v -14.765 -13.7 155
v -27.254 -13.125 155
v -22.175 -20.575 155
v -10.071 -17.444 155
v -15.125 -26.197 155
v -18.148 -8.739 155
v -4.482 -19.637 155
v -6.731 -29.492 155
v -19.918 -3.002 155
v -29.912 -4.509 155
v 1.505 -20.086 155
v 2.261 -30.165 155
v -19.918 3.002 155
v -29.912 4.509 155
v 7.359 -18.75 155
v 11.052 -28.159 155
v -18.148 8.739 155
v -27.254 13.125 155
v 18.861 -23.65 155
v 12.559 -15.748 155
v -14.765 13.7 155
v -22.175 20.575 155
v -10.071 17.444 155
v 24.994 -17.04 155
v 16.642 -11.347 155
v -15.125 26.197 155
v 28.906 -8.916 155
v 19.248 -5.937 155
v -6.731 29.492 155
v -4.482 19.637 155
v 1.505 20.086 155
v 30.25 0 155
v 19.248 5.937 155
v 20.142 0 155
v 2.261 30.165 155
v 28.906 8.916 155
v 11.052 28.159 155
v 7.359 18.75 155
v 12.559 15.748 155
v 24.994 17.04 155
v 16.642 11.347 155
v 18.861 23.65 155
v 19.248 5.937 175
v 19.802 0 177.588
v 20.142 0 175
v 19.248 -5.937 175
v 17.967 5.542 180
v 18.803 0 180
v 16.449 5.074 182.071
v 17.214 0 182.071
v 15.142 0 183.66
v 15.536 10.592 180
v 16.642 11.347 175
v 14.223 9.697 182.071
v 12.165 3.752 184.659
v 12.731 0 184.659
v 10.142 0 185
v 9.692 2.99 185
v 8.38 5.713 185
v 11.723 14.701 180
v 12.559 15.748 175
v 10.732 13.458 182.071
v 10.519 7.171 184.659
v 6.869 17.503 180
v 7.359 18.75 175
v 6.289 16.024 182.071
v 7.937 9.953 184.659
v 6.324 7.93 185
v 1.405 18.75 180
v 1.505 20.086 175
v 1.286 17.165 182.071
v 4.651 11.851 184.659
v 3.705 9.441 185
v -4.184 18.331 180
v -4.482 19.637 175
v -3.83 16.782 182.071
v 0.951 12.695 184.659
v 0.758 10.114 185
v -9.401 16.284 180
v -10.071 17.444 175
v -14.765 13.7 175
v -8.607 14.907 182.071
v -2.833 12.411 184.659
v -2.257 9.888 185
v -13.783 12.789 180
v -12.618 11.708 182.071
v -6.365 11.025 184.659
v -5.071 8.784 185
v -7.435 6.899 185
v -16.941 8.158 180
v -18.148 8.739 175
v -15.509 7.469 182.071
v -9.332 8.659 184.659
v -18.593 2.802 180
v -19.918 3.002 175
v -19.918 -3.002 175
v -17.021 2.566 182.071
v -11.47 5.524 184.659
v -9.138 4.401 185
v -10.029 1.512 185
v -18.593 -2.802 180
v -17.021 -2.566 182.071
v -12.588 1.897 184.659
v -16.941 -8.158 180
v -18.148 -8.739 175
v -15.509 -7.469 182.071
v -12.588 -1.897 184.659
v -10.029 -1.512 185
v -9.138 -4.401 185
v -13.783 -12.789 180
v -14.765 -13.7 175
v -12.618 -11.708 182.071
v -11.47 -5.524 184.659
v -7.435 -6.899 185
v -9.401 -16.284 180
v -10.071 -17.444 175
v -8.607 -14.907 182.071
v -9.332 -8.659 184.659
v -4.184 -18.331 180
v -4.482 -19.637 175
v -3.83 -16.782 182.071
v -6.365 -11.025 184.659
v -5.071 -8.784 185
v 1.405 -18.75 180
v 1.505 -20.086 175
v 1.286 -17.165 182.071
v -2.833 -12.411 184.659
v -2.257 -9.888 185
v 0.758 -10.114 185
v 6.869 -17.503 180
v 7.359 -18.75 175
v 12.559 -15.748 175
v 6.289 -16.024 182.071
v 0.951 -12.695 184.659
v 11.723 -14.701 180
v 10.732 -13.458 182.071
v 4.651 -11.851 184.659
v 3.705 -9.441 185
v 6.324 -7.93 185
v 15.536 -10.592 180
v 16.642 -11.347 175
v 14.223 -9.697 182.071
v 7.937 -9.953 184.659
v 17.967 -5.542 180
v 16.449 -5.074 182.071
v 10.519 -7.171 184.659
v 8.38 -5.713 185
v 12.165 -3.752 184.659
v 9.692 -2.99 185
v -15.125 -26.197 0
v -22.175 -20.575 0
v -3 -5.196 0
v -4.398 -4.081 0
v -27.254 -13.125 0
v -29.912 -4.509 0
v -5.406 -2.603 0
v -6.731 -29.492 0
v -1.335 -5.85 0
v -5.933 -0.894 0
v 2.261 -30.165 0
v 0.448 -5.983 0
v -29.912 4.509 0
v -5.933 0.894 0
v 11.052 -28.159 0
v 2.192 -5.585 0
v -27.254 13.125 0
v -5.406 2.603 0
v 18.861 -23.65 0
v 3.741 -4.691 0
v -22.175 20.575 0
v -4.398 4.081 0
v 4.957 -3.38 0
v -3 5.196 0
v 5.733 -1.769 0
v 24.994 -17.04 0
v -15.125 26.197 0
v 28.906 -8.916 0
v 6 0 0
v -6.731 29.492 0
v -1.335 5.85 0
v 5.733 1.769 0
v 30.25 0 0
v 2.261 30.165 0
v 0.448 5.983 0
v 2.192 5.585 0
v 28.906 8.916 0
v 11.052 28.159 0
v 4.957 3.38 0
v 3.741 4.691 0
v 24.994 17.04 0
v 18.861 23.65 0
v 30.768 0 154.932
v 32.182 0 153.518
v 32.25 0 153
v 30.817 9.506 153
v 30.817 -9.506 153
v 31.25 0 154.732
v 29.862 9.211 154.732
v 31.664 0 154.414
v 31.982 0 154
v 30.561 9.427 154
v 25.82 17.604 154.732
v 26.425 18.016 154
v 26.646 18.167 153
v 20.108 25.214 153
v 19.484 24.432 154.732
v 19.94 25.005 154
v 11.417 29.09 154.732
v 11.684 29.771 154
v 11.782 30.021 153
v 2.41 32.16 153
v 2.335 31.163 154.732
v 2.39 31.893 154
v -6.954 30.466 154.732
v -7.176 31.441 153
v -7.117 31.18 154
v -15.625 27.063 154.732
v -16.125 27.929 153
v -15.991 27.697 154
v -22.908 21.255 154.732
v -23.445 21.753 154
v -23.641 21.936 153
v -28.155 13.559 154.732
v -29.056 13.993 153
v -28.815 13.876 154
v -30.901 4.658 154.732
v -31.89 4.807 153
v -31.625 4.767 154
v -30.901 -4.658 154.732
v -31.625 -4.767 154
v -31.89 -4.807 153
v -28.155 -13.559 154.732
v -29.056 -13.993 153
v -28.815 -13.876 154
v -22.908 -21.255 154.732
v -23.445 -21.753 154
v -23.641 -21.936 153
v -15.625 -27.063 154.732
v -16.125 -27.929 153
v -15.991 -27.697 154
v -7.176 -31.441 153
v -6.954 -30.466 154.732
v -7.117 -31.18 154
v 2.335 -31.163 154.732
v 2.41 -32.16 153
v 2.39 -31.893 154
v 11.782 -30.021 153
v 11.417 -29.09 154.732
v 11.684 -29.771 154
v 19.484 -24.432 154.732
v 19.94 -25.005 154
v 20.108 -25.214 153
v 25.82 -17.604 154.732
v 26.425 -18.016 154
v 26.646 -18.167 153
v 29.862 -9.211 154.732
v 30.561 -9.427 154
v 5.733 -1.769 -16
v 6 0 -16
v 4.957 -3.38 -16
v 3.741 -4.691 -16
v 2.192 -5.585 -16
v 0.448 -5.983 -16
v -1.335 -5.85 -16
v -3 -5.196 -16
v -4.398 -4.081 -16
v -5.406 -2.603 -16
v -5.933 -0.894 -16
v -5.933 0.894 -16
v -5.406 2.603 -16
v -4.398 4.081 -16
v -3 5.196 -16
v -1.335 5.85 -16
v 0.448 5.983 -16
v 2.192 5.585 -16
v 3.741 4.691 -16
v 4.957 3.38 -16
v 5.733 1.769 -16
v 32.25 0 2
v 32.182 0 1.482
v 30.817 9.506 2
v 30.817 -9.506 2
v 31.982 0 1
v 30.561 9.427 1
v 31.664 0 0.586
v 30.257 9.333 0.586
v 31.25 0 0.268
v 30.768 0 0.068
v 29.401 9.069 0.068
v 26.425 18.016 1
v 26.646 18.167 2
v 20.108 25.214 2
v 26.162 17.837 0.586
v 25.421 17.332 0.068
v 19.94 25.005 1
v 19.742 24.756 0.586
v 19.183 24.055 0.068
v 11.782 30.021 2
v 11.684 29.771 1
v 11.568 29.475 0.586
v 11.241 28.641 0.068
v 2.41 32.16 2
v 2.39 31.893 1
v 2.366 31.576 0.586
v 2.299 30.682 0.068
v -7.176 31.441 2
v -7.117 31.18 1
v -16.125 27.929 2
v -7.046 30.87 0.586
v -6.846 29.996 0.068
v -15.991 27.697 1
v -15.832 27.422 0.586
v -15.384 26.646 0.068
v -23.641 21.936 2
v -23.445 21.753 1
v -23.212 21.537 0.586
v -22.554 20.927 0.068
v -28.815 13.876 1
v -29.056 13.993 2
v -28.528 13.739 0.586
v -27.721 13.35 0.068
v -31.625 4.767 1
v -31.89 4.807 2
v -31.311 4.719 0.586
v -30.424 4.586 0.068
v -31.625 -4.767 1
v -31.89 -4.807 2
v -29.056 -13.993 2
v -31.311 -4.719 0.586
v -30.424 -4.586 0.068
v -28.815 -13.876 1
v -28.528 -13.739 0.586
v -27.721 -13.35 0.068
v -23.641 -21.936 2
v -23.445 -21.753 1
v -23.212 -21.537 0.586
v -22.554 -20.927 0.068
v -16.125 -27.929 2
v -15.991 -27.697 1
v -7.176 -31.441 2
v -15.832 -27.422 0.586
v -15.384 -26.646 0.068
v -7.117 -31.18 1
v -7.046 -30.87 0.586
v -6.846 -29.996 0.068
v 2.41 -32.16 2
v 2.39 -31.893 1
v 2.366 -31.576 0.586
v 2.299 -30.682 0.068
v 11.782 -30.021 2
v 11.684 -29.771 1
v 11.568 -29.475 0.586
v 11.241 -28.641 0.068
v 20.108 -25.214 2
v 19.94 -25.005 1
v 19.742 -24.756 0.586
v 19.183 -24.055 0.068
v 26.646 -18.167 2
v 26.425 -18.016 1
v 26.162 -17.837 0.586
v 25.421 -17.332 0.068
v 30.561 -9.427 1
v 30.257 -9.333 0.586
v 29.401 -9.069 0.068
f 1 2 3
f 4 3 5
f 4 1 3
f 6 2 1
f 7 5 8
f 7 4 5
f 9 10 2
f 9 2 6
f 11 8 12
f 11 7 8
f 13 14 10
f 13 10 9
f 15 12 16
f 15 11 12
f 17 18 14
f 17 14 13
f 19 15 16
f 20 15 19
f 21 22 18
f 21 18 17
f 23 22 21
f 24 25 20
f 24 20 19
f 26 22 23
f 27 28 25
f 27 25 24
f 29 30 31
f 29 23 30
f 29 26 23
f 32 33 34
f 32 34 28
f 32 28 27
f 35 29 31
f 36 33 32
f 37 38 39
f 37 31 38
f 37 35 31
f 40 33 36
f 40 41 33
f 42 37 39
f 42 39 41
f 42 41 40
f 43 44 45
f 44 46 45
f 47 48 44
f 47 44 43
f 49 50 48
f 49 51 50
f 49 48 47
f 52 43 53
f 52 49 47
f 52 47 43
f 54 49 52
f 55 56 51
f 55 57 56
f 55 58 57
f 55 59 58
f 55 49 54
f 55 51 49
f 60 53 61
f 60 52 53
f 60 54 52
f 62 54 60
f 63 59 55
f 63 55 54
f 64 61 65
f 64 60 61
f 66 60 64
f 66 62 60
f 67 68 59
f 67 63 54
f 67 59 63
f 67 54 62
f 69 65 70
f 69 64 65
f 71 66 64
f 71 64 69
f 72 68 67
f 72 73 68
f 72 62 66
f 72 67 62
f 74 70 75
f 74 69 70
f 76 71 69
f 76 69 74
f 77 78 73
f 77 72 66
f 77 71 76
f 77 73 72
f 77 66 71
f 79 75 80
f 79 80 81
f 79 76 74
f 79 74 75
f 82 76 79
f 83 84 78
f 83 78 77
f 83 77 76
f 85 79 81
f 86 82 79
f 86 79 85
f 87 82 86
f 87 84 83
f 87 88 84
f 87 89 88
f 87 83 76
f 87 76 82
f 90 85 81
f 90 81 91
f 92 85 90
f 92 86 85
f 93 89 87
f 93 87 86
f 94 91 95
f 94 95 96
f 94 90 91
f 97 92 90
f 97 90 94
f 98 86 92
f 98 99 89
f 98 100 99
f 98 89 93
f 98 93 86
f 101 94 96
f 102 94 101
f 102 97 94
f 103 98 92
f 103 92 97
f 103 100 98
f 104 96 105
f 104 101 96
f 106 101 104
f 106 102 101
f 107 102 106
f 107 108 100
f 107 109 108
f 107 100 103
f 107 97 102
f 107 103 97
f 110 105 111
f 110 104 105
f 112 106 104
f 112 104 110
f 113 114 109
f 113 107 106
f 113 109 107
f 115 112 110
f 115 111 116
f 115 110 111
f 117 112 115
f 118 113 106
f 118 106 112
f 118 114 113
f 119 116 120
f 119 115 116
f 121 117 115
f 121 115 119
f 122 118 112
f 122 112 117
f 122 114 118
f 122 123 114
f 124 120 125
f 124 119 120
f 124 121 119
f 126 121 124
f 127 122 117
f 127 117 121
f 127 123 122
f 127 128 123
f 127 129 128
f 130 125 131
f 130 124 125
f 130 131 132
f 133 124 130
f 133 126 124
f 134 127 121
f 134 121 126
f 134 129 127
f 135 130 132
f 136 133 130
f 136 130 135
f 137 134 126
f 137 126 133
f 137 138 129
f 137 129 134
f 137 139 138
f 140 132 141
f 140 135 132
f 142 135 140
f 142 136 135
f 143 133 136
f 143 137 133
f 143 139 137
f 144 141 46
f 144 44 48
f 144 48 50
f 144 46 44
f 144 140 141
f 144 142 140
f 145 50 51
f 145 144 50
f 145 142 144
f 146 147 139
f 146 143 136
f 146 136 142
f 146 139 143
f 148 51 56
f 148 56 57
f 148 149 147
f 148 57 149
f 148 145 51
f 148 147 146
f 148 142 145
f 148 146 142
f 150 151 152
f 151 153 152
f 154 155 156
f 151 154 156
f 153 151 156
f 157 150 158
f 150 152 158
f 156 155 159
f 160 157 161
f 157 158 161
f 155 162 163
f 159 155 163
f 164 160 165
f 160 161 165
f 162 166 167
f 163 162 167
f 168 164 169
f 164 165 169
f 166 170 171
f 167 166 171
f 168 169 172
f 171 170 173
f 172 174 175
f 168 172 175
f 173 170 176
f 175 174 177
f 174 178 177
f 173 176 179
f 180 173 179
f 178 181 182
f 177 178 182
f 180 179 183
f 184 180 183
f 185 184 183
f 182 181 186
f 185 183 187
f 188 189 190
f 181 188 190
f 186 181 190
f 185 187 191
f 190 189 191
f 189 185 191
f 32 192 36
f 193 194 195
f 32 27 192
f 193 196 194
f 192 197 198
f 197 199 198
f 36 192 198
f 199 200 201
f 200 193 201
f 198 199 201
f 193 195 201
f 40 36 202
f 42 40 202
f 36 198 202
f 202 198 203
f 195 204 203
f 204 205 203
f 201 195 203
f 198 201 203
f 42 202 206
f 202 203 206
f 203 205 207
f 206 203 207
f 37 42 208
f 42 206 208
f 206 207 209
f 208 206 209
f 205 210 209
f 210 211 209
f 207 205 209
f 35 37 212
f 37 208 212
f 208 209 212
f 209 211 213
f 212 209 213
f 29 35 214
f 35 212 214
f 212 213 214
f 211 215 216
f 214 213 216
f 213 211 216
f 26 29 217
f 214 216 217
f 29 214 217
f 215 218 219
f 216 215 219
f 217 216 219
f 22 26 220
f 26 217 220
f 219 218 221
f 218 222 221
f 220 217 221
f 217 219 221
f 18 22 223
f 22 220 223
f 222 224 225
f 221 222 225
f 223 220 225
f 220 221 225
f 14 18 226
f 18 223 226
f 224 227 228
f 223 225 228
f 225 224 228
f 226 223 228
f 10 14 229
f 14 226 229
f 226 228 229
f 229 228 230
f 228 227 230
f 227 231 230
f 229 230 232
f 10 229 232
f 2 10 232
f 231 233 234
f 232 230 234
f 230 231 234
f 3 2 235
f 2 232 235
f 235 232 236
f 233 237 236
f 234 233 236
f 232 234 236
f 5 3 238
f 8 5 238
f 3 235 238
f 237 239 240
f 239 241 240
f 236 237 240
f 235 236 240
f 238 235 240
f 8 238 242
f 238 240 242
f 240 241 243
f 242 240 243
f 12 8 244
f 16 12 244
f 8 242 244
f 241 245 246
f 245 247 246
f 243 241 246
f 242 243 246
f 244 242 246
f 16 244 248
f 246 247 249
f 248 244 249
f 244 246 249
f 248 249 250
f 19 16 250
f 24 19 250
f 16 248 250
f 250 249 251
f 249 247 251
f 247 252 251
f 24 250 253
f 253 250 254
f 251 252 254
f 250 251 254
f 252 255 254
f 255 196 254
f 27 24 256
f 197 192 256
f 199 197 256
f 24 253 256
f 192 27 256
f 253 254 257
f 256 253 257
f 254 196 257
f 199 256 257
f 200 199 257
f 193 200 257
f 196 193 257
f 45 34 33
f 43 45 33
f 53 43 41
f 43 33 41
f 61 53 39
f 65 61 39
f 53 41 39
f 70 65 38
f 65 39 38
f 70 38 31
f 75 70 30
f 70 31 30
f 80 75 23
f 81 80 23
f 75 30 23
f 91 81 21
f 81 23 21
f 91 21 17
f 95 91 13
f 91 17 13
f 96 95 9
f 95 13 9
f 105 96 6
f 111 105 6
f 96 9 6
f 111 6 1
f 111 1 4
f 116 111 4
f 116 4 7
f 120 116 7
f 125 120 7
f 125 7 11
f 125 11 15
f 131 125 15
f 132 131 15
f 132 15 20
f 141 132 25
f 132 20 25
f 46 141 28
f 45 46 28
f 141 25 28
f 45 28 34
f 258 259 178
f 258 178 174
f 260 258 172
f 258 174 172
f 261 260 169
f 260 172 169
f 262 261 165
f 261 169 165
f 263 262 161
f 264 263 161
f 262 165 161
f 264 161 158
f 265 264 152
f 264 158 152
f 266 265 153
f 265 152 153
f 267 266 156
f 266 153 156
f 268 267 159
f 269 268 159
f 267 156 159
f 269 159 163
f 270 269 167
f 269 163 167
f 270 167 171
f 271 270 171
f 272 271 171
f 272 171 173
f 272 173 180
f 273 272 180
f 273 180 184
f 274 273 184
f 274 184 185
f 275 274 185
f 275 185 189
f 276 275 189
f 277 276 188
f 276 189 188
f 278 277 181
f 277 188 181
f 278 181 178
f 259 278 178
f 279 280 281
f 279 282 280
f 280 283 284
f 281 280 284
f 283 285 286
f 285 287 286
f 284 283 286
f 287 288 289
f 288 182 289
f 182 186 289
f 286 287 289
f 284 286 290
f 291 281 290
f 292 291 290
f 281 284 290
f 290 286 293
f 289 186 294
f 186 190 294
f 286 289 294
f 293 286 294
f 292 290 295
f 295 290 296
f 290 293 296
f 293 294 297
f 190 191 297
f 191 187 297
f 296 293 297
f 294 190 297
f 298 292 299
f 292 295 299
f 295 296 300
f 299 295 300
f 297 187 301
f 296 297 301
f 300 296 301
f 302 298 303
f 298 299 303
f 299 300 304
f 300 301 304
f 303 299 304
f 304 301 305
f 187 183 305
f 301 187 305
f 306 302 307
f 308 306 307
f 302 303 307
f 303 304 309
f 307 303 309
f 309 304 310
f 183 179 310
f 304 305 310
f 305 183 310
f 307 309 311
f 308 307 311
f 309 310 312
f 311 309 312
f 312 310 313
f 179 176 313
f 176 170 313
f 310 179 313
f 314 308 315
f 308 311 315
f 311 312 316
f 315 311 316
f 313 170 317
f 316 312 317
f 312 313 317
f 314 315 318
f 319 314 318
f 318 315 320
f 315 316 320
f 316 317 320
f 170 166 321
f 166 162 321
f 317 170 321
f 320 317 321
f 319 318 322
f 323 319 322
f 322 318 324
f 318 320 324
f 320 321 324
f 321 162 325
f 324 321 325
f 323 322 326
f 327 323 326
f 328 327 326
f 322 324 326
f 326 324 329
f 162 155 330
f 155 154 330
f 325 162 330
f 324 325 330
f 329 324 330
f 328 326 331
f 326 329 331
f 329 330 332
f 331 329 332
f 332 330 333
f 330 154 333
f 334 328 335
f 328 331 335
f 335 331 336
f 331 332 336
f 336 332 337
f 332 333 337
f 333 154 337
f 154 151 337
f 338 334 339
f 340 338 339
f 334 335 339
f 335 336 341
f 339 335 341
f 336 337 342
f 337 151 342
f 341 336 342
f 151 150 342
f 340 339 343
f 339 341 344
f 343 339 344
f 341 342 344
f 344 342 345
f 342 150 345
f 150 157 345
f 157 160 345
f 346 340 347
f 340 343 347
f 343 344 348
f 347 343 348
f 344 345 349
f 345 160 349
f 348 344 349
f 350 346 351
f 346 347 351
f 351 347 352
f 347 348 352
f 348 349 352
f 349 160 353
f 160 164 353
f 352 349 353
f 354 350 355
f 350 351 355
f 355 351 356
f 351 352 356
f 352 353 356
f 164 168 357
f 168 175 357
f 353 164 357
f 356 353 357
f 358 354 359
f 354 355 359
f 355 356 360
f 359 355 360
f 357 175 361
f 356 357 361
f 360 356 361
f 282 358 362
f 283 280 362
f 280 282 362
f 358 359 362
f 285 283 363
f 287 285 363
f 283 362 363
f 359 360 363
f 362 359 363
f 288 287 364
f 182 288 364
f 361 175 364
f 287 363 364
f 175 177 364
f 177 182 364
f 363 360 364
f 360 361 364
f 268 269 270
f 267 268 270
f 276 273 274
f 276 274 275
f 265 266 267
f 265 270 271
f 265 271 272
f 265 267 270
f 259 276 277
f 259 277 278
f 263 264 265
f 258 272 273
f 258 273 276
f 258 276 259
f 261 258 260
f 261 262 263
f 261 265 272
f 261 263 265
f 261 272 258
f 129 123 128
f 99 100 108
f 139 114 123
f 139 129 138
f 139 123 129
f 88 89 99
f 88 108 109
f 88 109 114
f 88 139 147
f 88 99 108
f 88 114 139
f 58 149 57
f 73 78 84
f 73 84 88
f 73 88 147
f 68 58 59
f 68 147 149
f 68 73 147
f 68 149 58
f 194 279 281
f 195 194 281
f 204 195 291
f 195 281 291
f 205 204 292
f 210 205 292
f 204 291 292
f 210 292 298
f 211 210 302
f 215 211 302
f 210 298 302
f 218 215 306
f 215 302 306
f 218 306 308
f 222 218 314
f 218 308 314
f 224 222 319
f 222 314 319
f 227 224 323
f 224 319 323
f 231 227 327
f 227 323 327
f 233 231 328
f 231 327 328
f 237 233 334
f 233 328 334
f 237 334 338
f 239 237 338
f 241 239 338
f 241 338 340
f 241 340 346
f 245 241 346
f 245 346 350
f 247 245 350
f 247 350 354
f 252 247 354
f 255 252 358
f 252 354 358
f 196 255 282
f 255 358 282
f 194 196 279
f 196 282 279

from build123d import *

# Parameters (mm, degrees)
F0_R     = 32.25
F1_DEPTH = 155
F2_R     = 20.142482
F3_DEPTH = 30
F4_R     = 10
F5_R     = 6
F6_DEPTH = 16
F7_R     = 2


with BuildPart() as f1:
    # F0 (on Top) → F1 (new body)
    with BuildSketch(Plane.XY):
        Circle(F0_R)
    extrude(amount=F1_DEPTH)

    # F2 (on face) → F3 (join)
    with BuildSketch(Plane.XY.offset(155)):
        Circle(F2_R)
    extrude(amount=F3_DEPTH)

    # F4
    f4_edges = [f1.edges().sort_by_distance(p)[0] for p in [
        (-20.142482, 0, 185),
    ]]
    fillet(f4_edges, radius=F4_R)

    # F5 (on face) → F6 (join)
    with BuildSketch(Plane(origin=(0, 0, 0), x_dir=(1, 0, 0), z_dir=(0, 0, -1))):
        Circle(F5_R)
    extrude(amount=F6_DEPTH)

    # F7
    f7_edges = [f1.edges().sort_by_distance(p)[0] for p in [
        (-32.25, 0, 155),
        (-32.25, 0, 0),
    ]]
    fillet(f7_edges, radius=F7_R)


solid = f1.part
